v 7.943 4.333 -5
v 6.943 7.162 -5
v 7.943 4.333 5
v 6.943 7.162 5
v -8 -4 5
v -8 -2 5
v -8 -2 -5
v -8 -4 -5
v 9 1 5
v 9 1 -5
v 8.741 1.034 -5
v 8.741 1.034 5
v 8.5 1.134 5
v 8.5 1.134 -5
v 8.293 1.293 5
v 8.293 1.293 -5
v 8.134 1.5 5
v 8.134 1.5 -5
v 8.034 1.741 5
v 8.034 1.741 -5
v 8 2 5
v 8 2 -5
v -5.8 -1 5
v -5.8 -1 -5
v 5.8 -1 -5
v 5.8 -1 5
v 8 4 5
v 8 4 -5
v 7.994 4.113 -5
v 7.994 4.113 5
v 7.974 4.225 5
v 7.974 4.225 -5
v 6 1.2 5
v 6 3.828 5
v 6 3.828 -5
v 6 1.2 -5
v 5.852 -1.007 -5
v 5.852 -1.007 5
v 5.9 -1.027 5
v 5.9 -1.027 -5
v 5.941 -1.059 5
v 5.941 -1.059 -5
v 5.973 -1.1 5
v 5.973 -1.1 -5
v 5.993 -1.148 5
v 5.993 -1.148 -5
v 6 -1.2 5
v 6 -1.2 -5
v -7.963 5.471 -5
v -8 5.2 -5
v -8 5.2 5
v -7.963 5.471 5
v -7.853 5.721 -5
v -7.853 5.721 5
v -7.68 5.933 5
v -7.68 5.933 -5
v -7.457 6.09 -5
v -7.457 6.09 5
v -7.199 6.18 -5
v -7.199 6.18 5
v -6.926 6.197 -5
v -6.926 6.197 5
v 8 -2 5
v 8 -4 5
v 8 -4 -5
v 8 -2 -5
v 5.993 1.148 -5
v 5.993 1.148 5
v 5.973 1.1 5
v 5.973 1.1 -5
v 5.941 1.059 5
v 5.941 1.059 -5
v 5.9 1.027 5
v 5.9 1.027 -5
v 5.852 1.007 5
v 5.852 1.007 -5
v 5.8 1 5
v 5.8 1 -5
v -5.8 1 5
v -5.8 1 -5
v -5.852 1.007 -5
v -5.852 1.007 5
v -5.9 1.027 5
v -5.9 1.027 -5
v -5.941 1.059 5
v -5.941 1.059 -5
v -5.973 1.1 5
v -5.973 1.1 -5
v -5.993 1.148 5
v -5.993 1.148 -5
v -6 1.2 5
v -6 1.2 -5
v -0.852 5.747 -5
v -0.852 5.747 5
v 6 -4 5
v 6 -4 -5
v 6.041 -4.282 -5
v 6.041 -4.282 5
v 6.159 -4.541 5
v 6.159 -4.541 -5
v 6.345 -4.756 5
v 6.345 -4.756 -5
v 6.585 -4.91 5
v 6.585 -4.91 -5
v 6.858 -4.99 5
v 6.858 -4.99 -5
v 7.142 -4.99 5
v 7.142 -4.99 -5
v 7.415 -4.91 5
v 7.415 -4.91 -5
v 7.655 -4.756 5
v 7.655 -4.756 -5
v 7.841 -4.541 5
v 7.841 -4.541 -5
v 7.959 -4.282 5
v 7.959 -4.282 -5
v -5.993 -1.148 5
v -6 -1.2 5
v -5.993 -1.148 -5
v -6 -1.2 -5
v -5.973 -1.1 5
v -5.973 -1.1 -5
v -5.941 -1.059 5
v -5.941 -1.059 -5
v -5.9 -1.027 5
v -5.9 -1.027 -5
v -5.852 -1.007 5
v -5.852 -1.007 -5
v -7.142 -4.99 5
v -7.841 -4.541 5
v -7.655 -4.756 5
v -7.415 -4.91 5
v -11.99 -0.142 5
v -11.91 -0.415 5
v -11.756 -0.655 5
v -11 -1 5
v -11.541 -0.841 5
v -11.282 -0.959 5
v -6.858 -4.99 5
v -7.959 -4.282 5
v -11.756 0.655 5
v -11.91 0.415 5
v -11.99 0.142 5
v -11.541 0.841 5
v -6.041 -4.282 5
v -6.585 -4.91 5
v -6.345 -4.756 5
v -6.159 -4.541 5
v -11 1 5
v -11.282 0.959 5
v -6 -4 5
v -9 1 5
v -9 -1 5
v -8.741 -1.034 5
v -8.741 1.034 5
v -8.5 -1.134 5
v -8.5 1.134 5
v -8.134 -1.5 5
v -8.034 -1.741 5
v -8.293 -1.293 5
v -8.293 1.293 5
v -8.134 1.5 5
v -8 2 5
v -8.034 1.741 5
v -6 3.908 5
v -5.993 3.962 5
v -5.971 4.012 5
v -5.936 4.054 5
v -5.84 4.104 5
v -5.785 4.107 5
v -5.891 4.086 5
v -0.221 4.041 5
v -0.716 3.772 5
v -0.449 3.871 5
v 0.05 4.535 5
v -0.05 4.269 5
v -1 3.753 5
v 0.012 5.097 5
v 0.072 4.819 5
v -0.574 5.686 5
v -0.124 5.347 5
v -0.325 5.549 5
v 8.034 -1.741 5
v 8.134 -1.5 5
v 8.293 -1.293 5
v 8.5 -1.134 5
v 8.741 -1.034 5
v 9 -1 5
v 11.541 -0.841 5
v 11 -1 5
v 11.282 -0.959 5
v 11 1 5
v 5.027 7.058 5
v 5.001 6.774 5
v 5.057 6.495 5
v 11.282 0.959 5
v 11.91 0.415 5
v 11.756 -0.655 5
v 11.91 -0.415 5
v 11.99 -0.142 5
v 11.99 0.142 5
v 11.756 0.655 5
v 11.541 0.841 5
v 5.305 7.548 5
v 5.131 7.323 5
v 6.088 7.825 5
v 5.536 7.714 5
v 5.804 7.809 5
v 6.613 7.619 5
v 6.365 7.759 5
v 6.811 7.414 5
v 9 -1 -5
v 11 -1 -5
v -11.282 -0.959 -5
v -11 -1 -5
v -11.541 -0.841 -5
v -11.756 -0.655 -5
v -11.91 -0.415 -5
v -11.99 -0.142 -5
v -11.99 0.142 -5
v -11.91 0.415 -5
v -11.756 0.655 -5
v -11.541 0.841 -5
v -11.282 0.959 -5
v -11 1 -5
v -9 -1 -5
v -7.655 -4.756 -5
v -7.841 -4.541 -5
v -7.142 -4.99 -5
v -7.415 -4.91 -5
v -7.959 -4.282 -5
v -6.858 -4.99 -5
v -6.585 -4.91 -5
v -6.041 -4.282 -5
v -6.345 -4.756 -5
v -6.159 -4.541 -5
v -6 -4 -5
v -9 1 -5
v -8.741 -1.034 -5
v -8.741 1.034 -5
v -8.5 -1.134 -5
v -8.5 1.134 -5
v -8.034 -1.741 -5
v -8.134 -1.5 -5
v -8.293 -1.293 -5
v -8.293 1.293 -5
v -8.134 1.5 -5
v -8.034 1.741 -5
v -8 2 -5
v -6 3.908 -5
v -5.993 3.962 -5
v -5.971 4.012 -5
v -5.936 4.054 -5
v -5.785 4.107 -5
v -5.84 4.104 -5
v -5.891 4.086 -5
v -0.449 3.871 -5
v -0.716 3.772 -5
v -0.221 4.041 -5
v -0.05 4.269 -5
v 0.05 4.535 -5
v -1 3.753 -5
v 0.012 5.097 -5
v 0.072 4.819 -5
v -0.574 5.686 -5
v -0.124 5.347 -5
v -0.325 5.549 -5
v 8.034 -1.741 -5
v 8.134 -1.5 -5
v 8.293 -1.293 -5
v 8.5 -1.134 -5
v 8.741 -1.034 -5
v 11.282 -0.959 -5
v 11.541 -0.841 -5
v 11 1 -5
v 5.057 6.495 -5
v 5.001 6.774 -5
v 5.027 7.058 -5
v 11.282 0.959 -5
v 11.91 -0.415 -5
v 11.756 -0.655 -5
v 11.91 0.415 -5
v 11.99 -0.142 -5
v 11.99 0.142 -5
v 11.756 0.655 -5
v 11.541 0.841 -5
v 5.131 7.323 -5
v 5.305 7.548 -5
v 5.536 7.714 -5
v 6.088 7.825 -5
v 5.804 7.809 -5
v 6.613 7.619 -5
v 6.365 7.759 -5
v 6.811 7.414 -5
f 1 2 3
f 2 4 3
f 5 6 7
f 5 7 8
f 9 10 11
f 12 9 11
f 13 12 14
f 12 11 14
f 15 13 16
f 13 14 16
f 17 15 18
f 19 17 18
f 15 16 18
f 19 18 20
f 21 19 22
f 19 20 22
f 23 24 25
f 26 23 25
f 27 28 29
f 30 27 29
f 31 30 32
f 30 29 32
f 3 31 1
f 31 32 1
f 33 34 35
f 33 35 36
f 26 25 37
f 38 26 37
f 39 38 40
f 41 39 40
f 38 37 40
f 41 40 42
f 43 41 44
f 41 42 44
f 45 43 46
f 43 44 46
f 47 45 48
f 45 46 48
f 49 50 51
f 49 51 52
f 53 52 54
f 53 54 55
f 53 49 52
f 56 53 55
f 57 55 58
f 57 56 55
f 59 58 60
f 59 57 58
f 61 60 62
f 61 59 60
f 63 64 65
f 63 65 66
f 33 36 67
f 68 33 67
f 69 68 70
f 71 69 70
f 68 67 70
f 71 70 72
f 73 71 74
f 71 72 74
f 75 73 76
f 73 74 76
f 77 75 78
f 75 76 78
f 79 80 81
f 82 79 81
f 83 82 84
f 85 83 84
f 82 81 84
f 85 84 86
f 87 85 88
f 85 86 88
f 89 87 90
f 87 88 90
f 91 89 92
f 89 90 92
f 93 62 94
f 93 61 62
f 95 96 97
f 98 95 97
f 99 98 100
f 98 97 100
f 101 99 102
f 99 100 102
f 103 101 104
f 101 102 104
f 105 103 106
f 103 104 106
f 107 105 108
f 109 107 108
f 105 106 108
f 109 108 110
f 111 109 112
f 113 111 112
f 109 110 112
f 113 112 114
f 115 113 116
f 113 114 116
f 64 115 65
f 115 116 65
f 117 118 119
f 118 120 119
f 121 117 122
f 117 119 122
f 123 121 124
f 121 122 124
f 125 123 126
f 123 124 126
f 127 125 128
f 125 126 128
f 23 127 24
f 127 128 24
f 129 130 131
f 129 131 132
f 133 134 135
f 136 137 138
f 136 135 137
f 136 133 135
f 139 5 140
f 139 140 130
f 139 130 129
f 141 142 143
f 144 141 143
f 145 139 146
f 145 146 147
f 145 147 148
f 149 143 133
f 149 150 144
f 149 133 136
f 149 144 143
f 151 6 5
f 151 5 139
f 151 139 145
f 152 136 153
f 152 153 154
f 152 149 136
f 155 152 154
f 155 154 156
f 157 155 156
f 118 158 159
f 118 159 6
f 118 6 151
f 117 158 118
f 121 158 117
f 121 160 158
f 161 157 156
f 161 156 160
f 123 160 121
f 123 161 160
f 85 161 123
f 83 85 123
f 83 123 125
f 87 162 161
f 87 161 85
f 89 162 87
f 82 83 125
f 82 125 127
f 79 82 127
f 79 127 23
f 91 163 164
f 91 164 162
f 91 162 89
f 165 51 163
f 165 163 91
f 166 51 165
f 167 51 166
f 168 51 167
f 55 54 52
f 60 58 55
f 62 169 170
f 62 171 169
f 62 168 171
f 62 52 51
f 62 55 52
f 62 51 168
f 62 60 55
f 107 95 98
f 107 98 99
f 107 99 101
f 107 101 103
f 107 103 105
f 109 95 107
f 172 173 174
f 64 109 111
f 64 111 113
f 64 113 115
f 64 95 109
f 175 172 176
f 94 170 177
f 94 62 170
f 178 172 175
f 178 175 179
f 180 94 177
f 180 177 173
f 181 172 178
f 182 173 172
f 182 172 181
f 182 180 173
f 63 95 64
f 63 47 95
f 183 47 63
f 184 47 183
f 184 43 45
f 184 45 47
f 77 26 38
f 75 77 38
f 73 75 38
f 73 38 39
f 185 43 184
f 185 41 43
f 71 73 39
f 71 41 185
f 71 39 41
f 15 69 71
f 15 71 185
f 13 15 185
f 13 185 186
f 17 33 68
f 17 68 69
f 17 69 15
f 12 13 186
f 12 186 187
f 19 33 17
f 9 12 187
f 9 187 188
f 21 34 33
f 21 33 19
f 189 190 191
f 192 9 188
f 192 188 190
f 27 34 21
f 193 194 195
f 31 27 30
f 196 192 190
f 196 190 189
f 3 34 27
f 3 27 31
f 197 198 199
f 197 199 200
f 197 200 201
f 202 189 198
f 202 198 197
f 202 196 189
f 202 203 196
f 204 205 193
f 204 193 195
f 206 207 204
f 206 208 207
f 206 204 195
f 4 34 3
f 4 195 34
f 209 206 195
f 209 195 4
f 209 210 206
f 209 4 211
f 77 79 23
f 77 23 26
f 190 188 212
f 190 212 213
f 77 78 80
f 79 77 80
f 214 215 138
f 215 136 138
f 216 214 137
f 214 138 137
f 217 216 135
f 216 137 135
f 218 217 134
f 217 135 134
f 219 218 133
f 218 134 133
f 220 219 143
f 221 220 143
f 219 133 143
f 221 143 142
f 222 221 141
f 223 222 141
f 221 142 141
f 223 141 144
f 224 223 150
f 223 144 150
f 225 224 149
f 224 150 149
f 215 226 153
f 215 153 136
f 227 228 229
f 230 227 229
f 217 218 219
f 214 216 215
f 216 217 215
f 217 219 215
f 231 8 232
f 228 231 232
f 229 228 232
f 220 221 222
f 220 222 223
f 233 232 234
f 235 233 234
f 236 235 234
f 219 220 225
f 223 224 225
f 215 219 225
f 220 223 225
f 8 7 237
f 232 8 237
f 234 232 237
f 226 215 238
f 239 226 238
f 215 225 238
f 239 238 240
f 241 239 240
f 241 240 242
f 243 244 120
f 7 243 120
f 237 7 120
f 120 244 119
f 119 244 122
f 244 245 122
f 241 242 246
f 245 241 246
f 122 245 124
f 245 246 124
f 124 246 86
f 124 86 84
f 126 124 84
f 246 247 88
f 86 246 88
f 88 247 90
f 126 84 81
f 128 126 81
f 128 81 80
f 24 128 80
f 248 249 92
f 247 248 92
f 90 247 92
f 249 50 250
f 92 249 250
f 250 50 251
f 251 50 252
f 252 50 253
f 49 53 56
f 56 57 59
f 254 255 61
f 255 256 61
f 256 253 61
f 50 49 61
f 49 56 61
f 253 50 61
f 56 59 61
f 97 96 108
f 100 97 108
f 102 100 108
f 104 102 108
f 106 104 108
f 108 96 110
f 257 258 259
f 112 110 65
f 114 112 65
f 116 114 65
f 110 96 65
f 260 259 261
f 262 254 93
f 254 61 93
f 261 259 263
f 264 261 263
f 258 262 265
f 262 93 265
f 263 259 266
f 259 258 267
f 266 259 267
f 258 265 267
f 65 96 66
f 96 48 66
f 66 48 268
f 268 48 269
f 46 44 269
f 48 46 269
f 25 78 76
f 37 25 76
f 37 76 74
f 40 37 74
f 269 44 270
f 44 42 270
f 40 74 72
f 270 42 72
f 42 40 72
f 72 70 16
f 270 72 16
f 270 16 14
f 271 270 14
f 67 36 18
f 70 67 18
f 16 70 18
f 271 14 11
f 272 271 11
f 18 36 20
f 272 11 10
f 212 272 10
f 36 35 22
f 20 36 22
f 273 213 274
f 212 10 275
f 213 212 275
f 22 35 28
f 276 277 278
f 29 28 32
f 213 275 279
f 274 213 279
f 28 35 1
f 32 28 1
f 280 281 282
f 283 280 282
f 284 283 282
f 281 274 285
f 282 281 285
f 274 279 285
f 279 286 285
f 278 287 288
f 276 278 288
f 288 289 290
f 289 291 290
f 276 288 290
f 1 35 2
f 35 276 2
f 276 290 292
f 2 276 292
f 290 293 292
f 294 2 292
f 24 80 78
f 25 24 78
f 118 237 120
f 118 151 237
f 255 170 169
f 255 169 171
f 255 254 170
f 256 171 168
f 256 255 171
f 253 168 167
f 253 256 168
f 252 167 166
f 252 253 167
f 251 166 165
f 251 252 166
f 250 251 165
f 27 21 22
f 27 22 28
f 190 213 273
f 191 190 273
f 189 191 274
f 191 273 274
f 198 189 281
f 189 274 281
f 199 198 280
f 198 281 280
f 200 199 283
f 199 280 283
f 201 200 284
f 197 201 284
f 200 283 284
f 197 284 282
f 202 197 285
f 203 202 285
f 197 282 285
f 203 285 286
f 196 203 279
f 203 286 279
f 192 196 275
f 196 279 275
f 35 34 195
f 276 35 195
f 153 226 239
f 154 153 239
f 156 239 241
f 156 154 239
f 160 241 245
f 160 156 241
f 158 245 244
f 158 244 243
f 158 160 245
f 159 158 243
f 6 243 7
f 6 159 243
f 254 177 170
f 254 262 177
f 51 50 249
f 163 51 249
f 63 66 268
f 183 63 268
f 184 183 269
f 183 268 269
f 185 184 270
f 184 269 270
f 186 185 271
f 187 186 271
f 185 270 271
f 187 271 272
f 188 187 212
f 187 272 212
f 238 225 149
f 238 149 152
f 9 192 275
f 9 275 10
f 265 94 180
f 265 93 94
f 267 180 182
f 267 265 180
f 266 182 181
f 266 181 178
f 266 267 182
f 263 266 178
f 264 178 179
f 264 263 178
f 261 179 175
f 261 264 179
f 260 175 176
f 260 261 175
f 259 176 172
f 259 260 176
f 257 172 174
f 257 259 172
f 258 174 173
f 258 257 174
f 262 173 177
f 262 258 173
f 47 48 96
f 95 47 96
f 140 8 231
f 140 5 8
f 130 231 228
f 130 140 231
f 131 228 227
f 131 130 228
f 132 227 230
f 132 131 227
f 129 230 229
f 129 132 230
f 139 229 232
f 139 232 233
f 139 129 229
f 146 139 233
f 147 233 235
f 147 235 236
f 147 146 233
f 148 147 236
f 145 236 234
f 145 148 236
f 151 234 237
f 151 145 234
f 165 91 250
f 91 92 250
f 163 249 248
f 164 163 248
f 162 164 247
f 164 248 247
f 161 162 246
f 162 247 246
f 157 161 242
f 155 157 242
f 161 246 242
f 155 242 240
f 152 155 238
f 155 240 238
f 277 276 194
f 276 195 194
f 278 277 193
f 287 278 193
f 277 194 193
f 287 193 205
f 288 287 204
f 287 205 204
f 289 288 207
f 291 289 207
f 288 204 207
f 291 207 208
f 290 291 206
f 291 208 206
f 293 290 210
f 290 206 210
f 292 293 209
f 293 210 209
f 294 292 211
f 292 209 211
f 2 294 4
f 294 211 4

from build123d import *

# Parameters (mm, degrees)
BOSS_EXTRUDE1_DEPTH = 5
BOSS_EXTRUDE2_DEPTH = 5
FILLET2_R           = 1
FILLET3_R           = 0.2
MIRROR2_START       = -5
MIRROR2_DEPTH       = 10
BOSS_EXTRUDE3_DEPTH = 5
FILLET4_R           = 0.2


# Read off the part's stored shape, not the designer's step: Mirror2
with BuildPart() as part:
    # Sketch1 → Boss-Extrude1 (new, symmetric)
    with BuildSketch(Plane.XY):
        with BuildLine():
            Line((-6, -1), (0, -1))
            Line((0, -1), (0, 1))
            Line((0, 1), (-6, 1))
            Line((-6, 1), (-8, 1))
            Line((-8, 1), (-8, -4))
            ThreePointArc((-8, -4), (-7, -5), (-6, -4))
            Line((-6, -4), (-6, -1))
        make_face()
    extrude(amount=BOSS_EXTRUDE1_DEPTH, both=True)

    # Sketch2 → Boss-Extrude2 (add, symmetric)
    with BuildSketch(Plane.XY):
        with BuildLine():
            Line((-8, -1), (-11, -1))
            ThreePointArc((-11, -1), (-12, 0), (-11, 1))
            Line((-11, 1), (-8, 1))
            ThreePointArc((-8, 1), (-7, 0), (-8, -1))
        make_face()
    extrude(amount=BOSS_EXTRUDE2_DEPTH, both=True)

    # Fillet2
    fillet2_edges = [part.edges().sort_by_distance(p)[0] for p in [
        (-8, -1, 0),
    ]]
    fillet(fillet2_edges, radius=FILLET2_R)

    # Fillet3
    fillet3_edges = [part.edges().sort_by_distance(p)[0] for p in [
        (-6, -1, 0),
    ]]
    fillet(fillet3_edges, radius=FILLET3_R)

    # Mirror2 outline → Mirror2 (add)
    with BuildSketch(Plane.XY.offset(MIRROR2_START)):
        with BuildLine():
            Line((5.8, 1), (0, 1))
            Line((0, 1), (0, -1))
            Line((0, -1), (5.8, -1))
            ThreePointArc((5.8, -1), (5.941421356, -1.058578644), (6, -1.2))
            Line((6, -1.2), (6, -4))
            ThreePointArc((6, -4), (7, -5), (8, -4))
            Line((8, -4), (8, -2))
            ThreePointArc((8, -2), (8.292893219, -1.292893219), (9, -1))
            Line((9, -1), (11, -1))
            ThreePointArc((11, -1), (12, 0), (11, 1))
            Line((11, 1), (9, 1))
            ThreePointArc((9, 1), (8.292893219, 1.292893219), (8, 2))
            Line((8, 2), (8, 4))
            ThreePointArc((8, 4), (7, 5), (6, 4))
            Line((6, 4), (6, 1.2))
            ThreePointArc((6, 1.2), (5.941421356, 1.058578644), (5.8, 1))
        make_face()
        with BuildLine():
            Line((-9, 1), (-5.8, 1))
            ThreePointArc((-5.8, 1), (-5.941421356, 1.058578644), (-6, 1.2))
            Line((-6, 1.2), (-6, 4))
            ThreePointArc((-6, 4), (-7, 5), (-8, 4))
            Line((-8, 4), (-8, 2))
            ThreePointArc((-8, 2), (-8.292893219, 1.292893219), (-9, 1))
        make_face()
    extrude(amount=MIRROR2_DEPTH)

    # Sketch4 → Boss-Extrude3 (add, symmetric)
    with BuildSketch(Plane.XY):
        with BuildLine():
            Line((-6.92611483, 6.197266755), (-0.852229659, 5.747266755))
            ThreePointArc((-0.852229659, 5.747266755), (0.071151926, 4.67611483), (-1, 3.752733245))
            Line((-1, 3.752733245), (-7.07388517, 4.202733245))
            ThreePointArc((-7.07388517, 4.202733245), (-7.997266755, 5.27388517), (-6.92611483, 6.197266755))
        make_face()
        with BuildLine():
            Line((6.057190958, 3.666666667), (5.057190958, 6.495093791))
            ThreePointArc((5.057190958, 6.495093791), (5.666666667, 7.771236166), (6.942809042, 7.161760458))
            Line((6.942809042, 7.161760458), (7.942809042, 4.333333333))
            ThreePointArc((7.942809042, 4.333333333), (7.333333333, 3.057190958), (6.057190958, 3.666666667))
        make_face()
        with BuildLine():
            Line((-6, 5.2), (-6, 4))
            ThreePointArc((-6, 4), (-7, 3), (-8, 4))
            Line((-8, 4), (-8, 5.2))
            ThreePointArc((-8, 5.2), (-7, 6.2), (-6, 5.2))
        make_face()
    extrude(amount=BOSS_EXTRUDE3_DEPTH, both=True)

    # Fillet4
    fillet4_edges = [part.edges().sort_by_distance(p)[0] for p in [
        (-6, 4.123171594, 0),
    ]]
    fillet(fillet4_edges, radius=FILLET4_R)


solid = part.part
